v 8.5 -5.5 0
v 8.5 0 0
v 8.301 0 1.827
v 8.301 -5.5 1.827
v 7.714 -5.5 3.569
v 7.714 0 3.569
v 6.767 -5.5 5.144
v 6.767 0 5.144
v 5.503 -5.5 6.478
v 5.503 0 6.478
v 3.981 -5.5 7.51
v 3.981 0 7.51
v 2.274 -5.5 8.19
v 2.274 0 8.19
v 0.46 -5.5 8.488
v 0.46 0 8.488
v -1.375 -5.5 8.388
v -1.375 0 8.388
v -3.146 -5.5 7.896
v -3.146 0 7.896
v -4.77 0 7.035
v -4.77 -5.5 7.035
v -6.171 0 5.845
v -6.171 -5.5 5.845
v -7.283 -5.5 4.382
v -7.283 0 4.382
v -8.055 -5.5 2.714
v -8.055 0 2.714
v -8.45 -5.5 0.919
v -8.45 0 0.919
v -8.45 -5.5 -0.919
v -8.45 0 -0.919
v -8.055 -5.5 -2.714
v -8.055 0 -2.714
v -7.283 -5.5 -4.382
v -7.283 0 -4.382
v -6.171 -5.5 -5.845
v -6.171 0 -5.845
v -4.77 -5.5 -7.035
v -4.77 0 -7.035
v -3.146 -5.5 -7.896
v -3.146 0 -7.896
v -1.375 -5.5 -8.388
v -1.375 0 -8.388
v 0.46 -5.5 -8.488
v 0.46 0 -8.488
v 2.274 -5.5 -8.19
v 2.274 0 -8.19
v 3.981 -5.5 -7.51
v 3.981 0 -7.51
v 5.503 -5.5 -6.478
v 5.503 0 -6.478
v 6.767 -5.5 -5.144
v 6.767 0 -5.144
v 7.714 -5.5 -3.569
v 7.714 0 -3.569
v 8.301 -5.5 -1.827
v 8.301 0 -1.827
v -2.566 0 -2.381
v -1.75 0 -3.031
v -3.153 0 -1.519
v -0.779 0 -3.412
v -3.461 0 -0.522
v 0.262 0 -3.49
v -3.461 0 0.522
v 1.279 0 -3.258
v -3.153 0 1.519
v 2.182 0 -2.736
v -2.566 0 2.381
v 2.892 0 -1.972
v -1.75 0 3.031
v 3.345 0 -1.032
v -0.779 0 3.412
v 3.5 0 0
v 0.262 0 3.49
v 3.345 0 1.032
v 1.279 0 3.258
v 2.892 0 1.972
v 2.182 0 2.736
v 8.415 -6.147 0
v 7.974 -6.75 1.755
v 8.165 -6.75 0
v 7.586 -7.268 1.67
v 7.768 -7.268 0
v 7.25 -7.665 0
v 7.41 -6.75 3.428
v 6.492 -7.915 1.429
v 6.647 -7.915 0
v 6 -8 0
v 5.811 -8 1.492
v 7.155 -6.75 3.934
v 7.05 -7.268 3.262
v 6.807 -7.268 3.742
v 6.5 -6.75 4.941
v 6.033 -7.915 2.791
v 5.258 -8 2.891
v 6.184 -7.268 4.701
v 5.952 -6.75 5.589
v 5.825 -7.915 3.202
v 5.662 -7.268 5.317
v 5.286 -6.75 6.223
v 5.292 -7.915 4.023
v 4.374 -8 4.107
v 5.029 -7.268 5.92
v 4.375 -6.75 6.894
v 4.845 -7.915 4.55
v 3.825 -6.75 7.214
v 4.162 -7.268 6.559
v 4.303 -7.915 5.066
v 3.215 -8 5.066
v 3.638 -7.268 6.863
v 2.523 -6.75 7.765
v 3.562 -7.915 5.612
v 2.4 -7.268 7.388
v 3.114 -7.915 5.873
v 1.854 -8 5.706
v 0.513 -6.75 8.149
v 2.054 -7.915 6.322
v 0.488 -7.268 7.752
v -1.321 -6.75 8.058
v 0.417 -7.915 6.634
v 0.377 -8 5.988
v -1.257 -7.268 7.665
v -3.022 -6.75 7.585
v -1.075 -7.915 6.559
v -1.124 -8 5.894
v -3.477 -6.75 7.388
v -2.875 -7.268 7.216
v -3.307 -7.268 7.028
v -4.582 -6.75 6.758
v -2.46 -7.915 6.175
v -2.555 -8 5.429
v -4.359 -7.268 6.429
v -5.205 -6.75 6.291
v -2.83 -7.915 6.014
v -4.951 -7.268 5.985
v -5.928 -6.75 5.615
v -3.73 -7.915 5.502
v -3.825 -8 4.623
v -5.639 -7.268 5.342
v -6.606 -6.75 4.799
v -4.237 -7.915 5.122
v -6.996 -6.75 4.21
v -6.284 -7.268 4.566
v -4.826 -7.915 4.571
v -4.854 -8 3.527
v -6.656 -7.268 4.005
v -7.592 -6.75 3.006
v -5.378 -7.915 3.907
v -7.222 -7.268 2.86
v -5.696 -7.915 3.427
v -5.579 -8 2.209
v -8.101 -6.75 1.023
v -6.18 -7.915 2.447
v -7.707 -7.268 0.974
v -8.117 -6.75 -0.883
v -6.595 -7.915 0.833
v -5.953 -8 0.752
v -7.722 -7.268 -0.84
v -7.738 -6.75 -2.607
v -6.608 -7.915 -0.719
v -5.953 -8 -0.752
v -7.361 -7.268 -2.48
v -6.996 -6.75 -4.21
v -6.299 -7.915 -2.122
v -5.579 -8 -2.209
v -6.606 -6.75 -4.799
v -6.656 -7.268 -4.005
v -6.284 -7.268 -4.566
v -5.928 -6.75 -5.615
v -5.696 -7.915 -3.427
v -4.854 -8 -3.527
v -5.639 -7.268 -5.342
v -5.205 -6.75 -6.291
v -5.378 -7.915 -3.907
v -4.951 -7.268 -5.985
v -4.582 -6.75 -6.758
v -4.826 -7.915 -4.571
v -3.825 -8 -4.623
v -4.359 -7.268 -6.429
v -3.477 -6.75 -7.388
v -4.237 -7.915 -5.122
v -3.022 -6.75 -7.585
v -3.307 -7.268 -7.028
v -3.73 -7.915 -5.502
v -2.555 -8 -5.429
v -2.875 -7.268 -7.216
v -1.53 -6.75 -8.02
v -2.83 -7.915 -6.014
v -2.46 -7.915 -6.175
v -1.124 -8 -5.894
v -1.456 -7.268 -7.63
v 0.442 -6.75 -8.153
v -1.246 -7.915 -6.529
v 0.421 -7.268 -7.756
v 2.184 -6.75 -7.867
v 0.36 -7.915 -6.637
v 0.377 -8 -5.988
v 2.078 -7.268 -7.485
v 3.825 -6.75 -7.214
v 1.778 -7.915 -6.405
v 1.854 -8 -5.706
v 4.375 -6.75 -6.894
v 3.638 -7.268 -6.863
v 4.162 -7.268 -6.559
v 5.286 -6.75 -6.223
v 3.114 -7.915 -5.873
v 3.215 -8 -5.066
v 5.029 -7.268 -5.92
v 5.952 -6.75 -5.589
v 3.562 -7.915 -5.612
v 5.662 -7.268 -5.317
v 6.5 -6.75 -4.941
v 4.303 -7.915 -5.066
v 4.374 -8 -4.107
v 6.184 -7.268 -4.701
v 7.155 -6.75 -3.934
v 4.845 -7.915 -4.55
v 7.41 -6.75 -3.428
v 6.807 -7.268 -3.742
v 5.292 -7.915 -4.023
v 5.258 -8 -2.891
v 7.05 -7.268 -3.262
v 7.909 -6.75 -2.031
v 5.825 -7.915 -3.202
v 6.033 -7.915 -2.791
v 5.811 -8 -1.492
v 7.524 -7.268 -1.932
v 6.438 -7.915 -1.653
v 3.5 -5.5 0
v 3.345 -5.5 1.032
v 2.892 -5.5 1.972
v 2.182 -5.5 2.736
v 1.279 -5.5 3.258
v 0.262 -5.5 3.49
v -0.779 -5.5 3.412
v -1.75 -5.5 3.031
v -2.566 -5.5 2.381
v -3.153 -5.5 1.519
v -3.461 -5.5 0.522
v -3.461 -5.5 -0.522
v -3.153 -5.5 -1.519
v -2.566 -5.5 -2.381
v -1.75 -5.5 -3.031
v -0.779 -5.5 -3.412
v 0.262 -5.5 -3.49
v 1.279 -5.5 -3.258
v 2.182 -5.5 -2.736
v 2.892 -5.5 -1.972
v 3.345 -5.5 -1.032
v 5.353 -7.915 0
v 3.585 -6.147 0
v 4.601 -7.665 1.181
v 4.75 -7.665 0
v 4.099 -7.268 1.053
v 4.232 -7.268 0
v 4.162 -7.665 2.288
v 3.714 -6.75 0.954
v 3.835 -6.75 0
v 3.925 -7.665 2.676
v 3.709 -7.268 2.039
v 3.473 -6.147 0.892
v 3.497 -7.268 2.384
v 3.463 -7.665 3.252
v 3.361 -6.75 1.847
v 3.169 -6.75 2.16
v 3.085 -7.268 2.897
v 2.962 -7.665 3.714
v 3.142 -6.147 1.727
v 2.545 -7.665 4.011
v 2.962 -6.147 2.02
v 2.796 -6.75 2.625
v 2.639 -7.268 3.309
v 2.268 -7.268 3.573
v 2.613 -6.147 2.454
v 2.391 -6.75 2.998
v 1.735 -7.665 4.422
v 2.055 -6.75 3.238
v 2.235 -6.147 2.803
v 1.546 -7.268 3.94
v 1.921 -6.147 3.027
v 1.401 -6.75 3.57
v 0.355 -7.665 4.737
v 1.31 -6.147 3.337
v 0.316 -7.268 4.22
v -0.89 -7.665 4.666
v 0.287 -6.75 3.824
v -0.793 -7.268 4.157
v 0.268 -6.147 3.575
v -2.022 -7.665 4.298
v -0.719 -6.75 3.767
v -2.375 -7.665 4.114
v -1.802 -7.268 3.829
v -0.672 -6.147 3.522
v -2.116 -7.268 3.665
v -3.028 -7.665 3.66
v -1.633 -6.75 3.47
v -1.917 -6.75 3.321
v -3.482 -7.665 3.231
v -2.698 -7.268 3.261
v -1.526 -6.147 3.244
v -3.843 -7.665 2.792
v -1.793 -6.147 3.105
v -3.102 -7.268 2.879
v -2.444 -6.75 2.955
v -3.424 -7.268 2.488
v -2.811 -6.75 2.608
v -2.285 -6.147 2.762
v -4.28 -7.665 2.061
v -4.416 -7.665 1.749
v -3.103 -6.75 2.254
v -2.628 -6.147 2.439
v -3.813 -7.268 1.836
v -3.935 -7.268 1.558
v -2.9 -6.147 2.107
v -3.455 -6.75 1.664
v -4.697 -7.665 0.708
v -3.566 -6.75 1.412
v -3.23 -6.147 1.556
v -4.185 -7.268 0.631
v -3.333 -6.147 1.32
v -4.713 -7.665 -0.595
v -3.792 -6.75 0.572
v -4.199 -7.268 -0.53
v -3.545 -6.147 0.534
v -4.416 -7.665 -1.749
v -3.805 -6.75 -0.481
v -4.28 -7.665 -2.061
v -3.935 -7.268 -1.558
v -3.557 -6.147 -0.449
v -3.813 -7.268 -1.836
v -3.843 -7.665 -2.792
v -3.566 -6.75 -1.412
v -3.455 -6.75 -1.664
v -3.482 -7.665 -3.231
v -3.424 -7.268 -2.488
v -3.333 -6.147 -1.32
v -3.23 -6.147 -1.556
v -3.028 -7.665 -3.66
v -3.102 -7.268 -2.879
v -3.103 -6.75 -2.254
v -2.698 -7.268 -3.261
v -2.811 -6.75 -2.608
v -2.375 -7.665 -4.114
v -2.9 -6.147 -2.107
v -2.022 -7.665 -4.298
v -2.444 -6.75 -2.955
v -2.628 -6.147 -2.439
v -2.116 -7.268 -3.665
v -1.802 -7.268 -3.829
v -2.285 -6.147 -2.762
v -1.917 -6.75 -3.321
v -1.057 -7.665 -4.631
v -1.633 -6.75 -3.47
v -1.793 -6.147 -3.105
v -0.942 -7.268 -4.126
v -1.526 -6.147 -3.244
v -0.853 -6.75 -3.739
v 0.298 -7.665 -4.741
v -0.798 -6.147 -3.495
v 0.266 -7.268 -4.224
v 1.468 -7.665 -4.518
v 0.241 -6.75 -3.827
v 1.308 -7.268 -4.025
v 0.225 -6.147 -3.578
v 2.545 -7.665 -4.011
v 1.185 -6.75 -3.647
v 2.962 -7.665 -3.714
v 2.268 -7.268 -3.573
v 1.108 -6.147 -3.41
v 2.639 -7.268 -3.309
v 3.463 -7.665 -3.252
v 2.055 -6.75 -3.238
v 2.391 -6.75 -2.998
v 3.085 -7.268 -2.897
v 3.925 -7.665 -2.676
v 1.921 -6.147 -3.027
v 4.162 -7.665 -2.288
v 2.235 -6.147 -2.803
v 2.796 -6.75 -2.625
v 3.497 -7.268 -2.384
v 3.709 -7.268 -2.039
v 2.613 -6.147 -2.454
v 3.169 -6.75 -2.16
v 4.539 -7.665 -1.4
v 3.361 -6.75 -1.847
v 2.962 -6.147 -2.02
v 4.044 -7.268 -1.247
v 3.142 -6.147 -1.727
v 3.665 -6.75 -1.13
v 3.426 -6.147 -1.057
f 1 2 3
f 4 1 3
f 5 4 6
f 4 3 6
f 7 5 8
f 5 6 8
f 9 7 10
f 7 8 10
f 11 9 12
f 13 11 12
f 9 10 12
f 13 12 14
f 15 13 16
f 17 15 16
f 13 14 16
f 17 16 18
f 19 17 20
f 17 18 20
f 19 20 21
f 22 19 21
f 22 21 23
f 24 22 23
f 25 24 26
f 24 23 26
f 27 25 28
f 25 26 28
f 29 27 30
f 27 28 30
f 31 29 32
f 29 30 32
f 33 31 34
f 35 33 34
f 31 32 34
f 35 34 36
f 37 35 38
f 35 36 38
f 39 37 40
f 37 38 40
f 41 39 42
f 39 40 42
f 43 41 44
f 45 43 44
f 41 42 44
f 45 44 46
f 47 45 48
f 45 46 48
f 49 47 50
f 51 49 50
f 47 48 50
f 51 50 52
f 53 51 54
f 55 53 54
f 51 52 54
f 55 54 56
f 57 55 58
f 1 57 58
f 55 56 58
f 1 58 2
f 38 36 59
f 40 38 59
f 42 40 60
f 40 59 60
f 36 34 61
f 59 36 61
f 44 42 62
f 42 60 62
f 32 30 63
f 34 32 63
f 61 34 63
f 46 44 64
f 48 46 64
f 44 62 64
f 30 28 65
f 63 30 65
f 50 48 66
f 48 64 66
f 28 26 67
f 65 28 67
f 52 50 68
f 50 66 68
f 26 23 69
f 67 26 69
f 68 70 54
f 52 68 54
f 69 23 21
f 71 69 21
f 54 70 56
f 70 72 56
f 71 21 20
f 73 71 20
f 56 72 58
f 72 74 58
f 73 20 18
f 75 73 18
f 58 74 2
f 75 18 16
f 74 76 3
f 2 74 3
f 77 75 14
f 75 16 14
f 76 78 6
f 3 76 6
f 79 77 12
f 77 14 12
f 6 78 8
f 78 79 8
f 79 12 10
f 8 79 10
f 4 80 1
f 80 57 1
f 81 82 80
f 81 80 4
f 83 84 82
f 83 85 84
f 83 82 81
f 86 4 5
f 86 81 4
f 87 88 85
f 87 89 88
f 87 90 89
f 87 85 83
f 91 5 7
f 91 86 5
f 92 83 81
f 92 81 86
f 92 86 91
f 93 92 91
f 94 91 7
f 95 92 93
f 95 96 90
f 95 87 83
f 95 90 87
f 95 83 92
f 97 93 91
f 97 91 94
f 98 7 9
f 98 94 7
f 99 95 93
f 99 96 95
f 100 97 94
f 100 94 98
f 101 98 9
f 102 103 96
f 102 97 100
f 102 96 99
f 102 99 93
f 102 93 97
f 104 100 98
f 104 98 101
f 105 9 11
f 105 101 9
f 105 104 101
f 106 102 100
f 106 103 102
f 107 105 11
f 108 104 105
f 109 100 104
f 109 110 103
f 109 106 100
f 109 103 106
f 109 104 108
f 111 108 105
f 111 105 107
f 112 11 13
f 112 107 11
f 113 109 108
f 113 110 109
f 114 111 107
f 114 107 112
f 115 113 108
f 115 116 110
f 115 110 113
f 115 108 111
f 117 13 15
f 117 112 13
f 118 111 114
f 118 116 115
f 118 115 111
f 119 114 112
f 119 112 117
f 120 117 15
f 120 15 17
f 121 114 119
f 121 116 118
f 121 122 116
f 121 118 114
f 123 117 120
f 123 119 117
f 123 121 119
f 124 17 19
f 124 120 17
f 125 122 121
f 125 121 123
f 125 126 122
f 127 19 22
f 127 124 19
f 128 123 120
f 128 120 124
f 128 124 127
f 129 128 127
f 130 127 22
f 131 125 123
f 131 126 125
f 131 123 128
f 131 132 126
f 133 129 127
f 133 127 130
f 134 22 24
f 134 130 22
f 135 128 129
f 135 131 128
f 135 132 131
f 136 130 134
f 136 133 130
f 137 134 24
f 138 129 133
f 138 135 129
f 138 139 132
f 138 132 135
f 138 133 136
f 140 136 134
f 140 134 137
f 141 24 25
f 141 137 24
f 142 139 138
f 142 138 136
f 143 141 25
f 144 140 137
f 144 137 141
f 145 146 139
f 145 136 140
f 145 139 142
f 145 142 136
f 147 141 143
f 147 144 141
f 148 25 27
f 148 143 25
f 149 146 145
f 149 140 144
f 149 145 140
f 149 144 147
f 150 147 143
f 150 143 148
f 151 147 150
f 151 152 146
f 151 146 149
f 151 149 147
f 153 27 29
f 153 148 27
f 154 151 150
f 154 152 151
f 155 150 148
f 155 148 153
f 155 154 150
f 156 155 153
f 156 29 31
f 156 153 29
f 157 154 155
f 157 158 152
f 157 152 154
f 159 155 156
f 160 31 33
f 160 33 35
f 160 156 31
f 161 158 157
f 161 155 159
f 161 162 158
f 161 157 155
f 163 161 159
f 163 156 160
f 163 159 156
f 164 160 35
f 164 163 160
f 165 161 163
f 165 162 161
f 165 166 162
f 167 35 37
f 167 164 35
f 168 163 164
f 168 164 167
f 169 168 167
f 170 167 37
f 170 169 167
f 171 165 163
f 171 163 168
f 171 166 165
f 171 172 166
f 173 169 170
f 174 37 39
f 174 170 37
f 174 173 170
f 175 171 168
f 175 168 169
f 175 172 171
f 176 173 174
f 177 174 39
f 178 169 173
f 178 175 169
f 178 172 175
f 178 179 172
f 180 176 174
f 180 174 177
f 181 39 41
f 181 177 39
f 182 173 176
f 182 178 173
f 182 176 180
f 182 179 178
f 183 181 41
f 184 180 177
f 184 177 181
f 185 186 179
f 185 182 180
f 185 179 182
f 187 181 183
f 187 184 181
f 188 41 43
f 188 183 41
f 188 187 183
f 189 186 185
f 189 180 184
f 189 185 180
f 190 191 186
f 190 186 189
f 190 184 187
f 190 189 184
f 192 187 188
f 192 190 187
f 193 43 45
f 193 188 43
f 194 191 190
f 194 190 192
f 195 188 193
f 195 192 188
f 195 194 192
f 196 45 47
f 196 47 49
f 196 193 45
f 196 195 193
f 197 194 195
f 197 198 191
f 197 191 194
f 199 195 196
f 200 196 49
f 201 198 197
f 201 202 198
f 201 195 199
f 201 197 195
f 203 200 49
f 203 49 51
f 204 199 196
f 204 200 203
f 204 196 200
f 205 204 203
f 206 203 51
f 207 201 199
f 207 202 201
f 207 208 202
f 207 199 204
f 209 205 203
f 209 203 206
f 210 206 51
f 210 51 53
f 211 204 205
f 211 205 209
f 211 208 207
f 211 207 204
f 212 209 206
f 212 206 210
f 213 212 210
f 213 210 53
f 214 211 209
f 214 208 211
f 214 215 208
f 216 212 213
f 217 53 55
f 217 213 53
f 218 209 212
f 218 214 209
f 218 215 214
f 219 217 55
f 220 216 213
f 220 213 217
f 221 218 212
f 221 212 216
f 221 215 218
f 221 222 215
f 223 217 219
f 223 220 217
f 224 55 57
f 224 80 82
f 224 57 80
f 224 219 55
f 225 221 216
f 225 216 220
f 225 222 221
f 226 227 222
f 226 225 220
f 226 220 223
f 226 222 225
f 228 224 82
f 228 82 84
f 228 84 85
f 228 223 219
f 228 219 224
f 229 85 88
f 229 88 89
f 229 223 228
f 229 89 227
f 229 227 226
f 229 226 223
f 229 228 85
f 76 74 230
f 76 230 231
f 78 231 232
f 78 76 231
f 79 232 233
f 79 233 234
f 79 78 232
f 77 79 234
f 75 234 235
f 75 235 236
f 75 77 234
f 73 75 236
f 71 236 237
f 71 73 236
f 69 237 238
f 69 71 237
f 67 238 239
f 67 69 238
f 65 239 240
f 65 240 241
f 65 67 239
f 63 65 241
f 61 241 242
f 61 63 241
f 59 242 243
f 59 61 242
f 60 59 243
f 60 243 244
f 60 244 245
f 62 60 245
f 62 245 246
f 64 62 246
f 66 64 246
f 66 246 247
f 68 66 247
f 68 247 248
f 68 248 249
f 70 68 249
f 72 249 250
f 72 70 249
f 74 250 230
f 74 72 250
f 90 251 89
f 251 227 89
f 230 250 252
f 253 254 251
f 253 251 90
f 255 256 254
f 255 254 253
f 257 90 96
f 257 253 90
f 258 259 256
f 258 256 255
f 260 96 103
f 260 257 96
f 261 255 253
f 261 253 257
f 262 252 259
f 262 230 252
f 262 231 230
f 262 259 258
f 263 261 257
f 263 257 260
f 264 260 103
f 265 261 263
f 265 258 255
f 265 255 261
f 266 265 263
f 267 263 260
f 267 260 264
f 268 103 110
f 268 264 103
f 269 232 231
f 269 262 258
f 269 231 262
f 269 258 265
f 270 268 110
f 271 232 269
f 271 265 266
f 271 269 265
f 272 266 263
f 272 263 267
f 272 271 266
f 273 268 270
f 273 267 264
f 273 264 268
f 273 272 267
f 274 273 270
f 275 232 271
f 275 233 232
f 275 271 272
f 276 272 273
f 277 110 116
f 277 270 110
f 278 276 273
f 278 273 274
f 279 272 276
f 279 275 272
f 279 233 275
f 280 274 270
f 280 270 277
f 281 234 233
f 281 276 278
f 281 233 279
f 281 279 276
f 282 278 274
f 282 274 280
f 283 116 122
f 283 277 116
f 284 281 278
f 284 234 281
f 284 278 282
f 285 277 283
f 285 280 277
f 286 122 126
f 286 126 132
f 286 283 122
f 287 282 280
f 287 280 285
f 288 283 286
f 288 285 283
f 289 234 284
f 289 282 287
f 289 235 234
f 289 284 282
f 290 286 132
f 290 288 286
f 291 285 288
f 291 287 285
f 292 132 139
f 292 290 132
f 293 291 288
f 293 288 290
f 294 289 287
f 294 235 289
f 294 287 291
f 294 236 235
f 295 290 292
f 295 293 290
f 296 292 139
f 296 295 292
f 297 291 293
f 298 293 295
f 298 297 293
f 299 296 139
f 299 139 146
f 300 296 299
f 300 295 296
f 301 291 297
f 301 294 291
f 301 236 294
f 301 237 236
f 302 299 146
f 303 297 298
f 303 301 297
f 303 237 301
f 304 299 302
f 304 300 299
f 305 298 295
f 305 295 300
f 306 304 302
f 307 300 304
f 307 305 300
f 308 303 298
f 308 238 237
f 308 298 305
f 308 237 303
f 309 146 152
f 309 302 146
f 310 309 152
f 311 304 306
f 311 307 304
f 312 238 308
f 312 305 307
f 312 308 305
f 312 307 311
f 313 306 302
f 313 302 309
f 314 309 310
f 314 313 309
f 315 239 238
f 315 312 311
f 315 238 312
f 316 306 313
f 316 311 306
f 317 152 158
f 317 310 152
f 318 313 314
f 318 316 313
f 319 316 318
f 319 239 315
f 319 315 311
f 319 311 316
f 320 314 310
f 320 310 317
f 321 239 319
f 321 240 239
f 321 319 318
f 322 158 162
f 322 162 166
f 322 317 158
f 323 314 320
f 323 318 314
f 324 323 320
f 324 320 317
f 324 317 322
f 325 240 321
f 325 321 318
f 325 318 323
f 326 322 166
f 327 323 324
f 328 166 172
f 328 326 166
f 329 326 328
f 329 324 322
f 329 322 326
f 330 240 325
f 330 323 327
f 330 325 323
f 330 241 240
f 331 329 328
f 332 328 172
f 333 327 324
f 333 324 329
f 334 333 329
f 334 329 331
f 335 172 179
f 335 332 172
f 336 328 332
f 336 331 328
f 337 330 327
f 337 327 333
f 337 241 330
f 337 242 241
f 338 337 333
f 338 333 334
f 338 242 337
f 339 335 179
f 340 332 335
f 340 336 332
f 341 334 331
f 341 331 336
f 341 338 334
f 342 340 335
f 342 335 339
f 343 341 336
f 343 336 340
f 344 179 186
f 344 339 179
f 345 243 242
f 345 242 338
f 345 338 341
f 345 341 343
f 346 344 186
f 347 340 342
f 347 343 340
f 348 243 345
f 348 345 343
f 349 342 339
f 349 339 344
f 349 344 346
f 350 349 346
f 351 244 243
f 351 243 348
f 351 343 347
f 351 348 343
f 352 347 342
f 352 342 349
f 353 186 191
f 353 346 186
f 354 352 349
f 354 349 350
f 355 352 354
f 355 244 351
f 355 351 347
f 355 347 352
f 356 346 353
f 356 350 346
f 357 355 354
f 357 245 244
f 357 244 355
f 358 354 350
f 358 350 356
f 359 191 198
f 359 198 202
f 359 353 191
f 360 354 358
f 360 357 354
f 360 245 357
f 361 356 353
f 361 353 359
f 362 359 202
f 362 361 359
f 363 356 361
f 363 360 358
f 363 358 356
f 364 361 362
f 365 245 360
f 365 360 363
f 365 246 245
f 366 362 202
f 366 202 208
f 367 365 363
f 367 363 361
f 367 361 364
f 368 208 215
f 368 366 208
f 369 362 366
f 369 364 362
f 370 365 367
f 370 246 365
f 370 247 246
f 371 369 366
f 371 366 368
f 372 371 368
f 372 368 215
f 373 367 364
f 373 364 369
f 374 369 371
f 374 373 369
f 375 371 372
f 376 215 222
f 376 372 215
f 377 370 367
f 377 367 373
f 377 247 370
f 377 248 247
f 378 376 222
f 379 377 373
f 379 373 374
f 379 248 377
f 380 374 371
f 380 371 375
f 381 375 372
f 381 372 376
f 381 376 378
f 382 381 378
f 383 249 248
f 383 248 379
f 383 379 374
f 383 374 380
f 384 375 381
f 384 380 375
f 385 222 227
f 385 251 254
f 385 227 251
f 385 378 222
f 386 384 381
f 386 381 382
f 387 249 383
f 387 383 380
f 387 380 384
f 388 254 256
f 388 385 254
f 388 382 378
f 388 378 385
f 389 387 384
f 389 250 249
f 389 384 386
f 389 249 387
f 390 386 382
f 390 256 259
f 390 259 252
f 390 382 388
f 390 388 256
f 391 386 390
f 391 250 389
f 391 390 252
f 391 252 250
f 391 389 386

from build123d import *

# Parameters (mm, degrees)
F0_R     = 8.5
F0_R_2   = 3.5
F1_DEPTH = 8
F2_R     = 2.5
F3_R     = 2.49999


# Not quite as in the source:
# - a fillet or chamfer is up to 0.001 mm smaller than in the source, because OpenCascade refuses the exact size


with BuildPart() as f1:
    # F0 (on Front) → F1 (new body)
    with BuildSketch(Plane.XZ):
        Circle(F0_R)
        Circle(F0_R_2, mode=Mode.SUBTRACT)
    extrude(amount=F1_DEPTH)

    # F2
    f2_edges = [f1.edges().sort_by_distance(p)[0] for p in [
        (-8.5, -8, 0),
    ]]
    fillet(f2_edges, radius=F2_R)

    # F3 (radius 2.5 in the source; OpenCascade refuses exactly that, so slightly less here)
    f3_edges = [f1.edges().sort_by_distance(p)[0] for p in [
        (-3.5, -8, 0),
    ]]
    fillet(f3_edges, radius=F3_R)


solid = f1.part
